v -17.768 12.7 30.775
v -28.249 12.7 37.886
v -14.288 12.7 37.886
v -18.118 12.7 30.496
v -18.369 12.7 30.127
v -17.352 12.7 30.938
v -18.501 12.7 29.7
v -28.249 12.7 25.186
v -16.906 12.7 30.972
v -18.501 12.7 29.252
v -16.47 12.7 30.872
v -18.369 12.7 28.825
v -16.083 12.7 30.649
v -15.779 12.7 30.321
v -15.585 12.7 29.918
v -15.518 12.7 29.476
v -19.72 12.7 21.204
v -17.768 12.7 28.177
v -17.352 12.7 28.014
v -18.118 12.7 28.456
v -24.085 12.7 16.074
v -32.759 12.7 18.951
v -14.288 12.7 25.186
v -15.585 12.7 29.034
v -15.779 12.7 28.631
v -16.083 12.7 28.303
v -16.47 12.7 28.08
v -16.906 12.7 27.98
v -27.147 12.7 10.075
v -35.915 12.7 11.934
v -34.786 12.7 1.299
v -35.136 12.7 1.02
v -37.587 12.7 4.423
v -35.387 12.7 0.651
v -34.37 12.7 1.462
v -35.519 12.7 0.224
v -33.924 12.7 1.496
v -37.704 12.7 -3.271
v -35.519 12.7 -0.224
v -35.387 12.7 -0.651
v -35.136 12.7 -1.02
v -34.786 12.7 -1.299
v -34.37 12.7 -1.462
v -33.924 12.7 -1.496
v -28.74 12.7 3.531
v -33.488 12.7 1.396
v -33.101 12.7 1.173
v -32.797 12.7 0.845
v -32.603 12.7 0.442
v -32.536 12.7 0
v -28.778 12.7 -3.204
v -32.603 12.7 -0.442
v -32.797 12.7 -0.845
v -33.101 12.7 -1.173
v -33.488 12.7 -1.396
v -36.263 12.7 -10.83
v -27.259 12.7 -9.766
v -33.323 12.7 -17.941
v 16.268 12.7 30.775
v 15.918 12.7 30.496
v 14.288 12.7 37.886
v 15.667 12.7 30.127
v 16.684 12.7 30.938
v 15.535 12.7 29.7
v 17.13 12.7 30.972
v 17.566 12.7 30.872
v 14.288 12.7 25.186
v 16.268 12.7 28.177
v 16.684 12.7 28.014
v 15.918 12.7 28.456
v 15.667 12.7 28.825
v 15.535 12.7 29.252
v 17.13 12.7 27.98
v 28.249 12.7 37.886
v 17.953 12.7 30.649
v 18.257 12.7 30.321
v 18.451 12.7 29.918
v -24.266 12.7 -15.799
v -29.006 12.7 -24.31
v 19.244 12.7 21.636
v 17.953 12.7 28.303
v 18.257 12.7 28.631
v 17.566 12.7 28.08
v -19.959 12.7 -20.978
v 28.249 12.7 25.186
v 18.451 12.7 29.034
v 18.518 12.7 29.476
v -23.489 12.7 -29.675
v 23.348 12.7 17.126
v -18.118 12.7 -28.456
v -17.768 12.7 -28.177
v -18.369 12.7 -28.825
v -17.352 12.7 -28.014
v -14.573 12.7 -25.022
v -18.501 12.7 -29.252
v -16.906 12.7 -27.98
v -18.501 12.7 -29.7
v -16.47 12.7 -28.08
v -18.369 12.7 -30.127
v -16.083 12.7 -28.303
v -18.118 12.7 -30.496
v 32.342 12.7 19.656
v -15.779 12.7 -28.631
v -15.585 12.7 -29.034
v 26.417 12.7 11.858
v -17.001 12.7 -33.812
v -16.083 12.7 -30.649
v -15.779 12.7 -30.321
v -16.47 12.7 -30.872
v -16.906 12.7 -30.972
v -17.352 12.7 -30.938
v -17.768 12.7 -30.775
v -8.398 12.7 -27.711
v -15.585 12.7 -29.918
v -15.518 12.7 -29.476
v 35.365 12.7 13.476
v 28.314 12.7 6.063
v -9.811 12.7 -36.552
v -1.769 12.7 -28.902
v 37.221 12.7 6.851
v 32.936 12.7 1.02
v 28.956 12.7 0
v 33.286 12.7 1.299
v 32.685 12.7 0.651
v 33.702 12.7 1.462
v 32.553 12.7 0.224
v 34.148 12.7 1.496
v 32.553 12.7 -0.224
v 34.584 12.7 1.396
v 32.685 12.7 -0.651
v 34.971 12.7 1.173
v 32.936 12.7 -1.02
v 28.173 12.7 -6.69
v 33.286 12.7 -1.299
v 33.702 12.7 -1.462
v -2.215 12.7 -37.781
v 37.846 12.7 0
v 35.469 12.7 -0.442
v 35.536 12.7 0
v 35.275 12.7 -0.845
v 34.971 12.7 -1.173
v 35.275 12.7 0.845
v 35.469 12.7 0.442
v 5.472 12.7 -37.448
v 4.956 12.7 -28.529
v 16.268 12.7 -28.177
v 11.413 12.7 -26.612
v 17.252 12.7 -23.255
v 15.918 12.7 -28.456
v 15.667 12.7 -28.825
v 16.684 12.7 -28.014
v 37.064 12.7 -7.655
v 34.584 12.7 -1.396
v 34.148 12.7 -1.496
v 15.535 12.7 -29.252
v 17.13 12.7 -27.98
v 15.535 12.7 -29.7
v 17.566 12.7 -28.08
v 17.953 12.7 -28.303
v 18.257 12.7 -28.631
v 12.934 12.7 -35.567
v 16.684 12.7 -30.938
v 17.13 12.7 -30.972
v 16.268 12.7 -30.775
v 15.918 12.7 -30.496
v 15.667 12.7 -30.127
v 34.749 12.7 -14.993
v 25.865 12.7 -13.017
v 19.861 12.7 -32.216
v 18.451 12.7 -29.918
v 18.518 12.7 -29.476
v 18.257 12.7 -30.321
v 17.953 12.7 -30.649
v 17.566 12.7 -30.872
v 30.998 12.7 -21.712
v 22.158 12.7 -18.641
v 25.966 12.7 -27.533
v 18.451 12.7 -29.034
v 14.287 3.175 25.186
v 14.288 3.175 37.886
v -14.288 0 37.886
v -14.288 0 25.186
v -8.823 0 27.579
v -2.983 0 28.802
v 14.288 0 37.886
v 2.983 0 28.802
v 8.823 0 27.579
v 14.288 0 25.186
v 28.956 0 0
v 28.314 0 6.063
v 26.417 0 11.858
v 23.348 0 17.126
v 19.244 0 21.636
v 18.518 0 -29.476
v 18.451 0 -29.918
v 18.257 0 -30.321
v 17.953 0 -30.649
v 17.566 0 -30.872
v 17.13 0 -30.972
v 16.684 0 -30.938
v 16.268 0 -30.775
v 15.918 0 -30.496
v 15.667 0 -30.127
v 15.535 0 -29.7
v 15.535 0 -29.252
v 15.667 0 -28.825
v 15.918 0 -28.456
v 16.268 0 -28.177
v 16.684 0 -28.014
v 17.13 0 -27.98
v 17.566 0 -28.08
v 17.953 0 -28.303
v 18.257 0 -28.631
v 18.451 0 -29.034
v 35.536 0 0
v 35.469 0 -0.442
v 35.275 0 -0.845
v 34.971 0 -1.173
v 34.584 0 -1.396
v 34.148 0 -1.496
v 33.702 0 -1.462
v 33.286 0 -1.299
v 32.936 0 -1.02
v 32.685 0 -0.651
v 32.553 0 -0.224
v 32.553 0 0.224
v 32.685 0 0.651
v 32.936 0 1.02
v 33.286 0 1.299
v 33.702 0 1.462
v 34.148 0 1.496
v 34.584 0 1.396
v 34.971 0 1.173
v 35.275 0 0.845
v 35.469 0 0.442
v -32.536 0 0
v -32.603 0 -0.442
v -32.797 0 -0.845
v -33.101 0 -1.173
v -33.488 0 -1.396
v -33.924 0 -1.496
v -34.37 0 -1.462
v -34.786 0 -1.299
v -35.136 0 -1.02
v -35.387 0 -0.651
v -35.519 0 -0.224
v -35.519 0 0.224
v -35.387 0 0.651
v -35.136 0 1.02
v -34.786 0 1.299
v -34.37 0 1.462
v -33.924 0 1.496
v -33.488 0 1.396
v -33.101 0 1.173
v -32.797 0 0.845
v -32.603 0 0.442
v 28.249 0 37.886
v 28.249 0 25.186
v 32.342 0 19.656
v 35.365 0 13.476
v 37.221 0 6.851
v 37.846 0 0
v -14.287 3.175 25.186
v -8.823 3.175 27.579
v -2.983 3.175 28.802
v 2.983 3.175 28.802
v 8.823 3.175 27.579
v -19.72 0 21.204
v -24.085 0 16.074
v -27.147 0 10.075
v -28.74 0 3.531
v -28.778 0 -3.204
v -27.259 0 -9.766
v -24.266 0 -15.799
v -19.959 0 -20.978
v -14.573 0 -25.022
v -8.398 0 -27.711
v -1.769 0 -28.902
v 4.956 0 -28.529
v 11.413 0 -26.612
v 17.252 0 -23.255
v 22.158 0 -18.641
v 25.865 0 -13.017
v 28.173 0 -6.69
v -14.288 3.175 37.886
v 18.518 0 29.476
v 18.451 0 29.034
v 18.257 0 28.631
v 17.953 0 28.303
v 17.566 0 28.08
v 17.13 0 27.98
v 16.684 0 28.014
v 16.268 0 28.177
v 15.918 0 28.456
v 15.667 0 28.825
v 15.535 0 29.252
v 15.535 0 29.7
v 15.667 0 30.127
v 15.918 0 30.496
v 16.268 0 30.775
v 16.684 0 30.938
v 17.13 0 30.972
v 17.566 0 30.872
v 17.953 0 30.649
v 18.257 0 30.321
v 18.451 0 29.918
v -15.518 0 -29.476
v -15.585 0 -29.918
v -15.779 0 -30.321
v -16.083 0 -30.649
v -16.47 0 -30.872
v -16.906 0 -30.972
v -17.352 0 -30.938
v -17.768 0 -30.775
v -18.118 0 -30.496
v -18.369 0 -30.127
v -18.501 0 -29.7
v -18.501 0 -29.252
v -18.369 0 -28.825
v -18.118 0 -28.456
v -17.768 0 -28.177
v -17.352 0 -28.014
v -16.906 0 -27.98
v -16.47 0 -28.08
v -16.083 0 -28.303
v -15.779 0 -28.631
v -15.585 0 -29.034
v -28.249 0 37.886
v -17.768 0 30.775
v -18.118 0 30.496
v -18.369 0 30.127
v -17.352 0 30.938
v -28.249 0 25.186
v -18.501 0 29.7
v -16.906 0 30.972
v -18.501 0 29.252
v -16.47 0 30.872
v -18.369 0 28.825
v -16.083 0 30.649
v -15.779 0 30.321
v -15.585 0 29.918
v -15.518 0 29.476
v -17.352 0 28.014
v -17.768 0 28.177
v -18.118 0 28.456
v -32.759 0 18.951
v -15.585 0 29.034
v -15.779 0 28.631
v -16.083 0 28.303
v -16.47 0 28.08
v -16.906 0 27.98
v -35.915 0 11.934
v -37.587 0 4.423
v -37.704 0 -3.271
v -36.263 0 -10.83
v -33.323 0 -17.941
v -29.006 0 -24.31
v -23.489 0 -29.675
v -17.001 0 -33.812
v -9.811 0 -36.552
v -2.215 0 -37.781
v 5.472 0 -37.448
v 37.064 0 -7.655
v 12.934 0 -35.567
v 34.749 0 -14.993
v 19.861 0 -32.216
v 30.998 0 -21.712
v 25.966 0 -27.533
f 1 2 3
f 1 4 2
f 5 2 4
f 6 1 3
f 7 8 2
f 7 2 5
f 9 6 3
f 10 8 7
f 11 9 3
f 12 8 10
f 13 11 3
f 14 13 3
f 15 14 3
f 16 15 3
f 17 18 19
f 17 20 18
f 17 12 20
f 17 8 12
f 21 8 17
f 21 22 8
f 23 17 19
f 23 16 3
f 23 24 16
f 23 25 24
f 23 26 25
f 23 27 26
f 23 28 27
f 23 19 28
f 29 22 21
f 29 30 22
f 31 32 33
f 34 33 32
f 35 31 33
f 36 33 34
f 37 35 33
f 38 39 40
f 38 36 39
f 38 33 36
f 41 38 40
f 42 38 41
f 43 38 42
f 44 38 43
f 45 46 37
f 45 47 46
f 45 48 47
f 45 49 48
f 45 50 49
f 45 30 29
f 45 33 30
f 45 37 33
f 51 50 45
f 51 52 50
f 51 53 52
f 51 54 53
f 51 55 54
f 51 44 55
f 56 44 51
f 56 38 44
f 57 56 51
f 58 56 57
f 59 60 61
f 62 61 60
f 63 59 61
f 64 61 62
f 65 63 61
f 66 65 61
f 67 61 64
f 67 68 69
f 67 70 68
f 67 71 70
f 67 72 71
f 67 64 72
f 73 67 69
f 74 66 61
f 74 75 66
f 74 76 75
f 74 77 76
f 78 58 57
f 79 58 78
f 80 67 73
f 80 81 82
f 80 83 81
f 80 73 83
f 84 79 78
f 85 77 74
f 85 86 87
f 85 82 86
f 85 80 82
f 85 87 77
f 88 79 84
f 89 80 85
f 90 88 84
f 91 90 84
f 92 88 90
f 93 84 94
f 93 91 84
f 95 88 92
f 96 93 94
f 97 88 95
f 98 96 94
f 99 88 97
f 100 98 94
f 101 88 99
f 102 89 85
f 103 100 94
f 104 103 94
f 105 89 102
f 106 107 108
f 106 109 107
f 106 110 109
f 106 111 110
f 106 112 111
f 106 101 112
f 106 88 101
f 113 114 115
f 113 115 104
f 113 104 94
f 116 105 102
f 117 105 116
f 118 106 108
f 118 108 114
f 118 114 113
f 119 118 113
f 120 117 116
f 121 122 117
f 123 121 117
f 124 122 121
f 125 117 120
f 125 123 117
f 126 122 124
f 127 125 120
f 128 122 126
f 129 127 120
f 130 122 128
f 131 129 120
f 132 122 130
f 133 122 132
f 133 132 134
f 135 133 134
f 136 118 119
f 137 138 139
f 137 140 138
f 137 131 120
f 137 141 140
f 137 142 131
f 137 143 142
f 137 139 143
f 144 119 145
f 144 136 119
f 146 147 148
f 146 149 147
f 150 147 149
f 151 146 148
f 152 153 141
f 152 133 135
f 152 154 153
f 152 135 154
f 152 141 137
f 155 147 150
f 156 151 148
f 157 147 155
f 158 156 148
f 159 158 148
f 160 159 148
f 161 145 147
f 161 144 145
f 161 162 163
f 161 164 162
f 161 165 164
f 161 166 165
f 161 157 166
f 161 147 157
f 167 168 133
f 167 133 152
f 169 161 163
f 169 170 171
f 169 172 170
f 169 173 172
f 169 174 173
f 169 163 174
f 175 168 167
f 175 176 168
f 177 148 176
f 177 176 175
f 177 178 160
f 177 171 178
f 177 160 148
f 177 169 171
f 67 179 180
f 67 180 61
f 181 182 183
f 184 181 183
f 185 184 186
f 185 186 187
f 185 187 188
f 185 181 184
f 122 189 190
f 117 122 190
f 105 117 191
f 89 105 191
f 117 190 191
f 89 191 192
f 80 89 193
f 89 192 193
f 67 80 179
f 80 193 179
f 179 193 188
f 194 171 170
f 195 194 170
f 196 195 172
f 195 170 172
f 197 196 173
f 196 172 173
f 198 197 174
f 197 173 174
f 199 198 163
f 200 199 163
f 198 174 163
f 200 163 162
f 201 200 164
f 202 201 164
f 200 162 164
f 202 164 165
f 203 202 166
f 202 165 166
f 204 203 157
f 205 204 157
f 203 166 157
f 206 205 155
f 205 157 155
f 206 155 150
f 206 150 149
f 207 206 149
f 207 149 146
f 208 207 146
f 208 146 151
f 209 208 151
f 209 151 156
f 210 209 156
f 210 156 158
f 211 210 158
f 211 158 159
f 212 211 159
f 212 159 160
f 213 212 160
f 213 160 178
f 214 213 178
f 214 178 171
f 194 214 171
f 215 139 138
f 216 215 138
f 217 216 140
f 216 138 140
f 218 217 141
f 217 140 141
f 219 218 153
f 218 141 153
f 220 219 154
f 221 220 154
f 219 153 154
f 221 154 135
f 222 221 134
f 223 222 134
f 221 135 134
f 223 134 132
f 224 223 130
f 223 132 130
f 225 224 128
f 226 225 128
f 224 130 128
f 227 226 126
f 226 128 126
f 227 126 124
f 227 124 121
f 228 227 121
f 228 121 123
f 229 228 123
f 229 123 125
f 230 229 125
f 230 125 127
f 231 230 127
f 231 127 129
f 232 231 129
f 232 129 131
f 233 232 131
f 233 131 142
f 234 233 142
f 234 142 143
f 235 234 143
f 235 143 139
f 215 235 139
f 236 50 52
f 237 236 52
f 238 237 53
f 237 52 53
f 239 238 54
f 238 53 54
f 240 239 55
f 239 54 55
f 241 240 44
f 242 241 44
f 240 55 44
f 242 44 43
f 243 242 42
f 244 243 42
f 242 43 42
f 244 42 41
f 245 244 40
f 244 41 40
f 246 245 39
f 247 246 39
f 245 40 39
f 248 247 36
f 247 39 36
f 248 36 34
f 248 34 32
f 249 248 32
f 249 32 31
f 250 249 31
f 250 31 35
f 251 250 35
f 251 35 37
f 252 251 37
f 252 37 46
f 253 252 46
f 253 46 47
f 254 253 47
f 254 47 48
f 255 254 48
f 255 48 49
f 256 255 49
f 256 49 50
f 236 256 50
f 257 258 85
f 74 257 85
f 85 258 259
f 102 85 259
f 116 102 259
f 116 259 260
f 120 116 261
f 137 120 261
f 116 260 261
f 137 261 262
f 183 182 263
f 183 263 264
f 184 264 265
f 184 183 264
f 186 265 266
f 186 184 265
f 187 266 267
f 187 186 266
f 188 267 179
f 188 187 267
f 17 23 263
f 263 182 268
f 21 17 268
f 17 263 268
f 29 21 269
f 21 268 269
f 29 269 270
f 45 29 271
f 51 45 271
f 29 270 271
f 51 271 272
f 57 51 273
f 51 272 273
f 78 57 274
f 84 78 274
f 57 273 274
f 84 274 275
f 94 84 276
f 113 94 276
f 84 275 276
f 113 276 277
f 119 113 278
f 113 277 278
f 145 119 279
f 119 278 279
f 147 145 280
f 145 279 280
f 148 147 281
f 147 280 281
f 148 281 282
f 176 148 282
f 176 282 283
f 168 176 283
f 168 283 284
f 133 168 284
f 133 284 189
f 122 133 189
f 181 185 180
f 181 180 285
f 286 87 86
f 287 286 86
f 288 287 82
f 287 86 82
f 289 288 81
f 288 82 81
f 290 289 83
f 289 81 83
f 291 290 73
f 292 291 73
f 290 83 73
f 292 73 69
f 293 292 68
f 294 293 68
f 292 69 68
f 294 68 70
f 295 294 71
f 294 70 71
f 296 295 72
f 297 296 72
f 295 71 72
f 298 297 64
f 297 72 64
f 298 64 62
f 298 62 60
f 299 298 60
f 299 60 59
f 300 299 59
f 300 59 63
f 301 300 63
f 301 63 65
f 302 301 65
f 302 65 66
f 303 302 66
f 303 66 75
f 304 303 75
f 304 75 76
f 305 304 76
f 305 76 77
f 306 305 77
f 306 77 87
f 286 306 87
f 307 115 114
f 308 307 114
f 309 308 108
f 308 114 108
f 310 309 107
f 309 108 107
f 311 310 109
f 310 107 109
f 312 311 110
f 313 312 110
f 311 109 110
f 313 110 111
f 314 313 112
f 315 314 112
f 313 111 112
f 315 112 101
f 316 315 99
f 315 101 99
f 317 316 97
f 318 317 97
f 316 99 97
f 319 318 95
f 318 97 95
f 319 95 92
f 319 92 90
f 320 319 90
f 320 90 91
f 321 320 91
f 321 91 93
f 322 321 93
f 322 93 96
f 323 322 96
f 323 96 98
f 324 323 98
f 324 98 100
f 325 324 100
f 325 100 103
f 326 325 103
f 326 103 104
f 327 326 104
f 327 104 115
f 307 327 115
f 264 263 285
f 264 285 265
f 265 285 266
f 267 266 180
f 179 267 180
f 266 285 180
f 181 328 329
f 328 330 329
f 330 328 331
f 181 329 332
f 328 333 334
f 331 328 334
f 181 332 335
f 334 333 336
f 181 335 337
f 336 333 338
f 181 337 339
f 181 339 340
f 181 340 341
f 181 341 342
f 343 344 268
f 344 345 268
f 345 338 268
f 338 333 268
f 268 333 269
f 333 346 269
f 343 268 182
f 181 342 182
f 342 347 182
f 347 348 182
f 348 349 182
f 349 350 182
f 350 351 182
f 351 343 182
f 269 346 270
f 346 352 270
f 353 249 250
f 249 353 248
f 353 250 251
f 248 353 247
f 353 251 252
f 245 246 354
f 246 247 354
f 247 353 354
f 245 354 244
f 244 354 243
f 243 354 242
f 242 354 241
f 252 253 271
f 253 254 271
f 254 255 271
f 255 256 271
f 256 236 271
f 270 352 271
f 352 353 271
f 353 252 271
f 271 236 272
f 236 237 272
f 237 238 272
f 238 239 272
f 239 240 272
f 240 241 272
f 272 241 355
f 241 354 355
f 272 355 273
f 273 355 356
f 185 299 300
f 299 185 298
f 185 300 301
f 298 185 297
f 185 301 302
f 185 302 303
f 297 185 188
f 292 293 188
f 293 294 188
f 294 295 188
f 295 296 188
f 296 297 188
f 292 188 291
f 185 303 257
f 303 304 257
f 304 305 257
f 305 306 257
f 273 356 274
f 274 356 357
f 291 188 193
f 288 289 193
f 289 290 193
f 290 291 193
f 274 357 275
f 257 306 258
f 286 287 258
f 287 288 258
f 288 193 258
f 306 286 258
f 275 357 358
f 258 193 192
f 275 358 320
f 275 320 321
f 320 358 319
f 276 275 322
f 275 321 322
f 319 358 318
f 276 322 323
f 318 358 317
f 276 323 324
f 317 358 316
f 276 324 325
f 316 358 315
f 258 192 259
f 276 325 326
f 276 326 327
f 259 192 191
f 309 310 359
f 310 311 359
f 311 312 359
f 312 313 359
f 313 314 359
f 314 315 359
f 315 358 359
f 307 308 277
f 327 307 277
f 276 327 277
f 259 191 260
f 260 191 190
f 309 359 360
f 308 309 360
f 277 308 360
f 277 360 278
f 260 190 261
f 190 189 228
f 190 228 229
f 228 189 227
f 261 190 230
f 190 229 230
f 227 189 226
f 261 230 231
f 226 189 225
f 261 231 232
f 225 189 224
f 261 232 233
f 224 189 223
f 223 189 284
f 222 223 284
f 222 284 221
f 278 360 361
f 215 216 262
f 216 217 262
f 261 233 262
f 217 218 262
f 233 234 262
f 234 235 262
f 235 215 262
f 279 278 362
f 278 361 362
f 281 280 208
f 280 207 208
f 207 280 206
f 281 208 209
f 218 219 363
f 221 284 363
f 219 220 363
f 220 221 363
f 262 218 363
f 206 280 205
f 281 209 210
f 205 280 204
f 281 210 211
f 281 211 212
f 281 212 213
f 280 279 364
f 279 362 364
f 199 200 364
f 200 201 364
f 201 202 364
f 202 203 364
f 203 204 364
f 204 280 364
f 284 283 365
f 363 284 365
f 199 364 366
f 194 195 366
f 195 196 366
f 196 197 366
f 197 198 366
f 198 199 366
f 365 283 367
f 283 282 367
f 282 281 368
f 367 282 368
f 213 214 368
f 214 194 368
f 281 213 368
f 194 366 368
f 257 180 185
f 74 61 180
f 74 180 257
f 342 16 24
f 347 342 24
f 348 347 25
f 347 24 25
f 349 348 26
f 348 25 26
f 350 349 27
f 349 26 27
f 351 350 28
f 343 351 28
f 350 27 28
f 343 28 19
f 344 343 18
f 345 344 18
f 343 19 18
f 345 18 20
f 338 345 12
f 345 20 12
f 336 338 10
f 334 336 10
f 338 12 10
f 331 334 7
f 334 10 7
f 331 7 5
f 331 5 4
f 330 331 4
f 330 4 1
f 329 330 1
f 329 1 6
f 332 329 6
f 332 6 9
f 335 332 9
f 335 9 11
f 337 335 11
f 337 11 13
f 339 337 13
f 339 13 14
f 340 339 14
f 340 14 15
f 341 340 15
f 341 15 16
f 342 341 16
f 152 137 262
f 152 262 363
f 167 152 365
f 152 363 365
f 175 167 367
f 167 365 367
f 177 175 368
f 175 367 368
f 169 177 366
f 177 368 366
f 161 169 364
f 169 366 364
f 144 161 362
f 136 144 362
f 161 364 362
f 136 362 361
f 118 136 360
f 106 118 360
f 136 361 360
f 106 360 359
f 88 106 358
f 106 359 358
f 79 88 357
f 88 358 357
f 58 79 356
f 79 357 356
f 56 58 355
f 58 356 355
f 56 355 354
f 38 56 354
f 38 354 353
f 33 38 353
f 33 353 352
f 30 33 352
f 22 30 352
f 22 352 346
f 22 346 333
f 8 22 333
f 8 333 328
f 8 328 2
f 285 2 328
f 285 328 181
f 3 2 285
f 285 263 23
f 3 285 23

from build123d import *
from build123d.topology import SkipClean

# Parameters (mm, degrees)
BOSS_EXTRUDE1_DEPTH   = 12.7
SKETCH5_W             = 13.961436905
SKETCH5_H             = 12.7
BOSS_EXTRUDE3_DEPTH   = 12.7
F_3_0MM_DOWEL_HOLE1_D = 3
BOSS_EXTRUDE4_DEPTH   = 3.175


with BuildPart() as part:
    # Sketch1 → Boss-Extrude1 (new body)
    with BuildSketch(Plane(origin=(0, 0, 0), x_dir=(1, 0, 0), z_dir=(0, 1, 0))):
        with BuildLine():
            ThreePointArc((28.956, 0), (25.021578547, -14.572938722), (14.2875, -25.18565623))
            Line((14.2875, -25.18565623), (28.248936905, -25.18565623))
            ThreePointArc((28.248936905, -25.18565623), (35.365442045, -13.476098284), (37.846, 0))
            ThreePointArc((37.846, 0), (-13.476098284, 35.365442045), (-28.248936905, -25.18565623))
            Line((-28.248936905, -25.18565623), (-14.2875, -25.18565623))
            ThreePointArc((-14.2875, -25.18565623), (-14.572938722, 25.021578547), (28.956, 0))
        make_face()
    extrude(amount=BOSS_EXTRUDE1_DEPTH)

    # Sketch5 → Boss-Extrude3 (add)
    with BuildSketch(Plane.XY.offset(25.18565623)):
        with Locations((-21.268218453, 6.35)):
            Rectangle(SKETCH5_W, SKETCH5_H)
        with Locations((21.268218453, 6.35)):
            Rectangle(SKETCH5_W, SKETCH5_H)
    extrude(amount=BOSS_EXTRUDE3_DEPTH)

    # Ø3.0mm Dowel Hole1 (through all)
    with Locations(Plane(origin=(0, 0, 0), x_dir=(-1, 0, 0), z_dir=(0, -1, 0))):
        with Locations((-17.018, 29.476040643), (-34.036, 0), (17.018, 29.476040643), (34.036, 0), (17.018, -29.476040643), (-17.018, -29.476040643)):
            Hole(F_3_0MM_DOWEL_HOLE1_D / 2)

    # Sketch11 → Boss-Extrude4 (add)
    with SkipClean():  # the faces are left unmerged after this step: merging them gives an invalid solid
        with BuildSketch(Plane.XZ):
            with BuildLine():
                ThreePointArc((-14.2875, 25.18565623), (0, 28.956), (14.2875, 25.18565623))
                Line((14.2875, 25.18565623), (14.2875, 37.88565623))
                Line((14.2875, 37.88565623), (-14.2875, 37.88565623))
                Line((-14.2875, 37.88565623), (-14.2875, 25.18565623))
            make_face()
        extrude(amount=-BOSS_EXTRUDE4_DEPTH)


solid = part.part
